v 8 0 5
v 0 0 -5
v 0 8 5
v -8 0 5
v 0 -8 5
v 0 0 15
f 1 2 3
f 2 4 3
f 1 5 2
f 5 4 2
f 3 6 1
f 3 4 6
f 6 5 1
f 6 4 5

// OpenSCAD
cylinder(10,0,8, $fn = 4, center = true);

translate([0,0,10])
cylinder(10,8,0, $fn = 4, center = true);
